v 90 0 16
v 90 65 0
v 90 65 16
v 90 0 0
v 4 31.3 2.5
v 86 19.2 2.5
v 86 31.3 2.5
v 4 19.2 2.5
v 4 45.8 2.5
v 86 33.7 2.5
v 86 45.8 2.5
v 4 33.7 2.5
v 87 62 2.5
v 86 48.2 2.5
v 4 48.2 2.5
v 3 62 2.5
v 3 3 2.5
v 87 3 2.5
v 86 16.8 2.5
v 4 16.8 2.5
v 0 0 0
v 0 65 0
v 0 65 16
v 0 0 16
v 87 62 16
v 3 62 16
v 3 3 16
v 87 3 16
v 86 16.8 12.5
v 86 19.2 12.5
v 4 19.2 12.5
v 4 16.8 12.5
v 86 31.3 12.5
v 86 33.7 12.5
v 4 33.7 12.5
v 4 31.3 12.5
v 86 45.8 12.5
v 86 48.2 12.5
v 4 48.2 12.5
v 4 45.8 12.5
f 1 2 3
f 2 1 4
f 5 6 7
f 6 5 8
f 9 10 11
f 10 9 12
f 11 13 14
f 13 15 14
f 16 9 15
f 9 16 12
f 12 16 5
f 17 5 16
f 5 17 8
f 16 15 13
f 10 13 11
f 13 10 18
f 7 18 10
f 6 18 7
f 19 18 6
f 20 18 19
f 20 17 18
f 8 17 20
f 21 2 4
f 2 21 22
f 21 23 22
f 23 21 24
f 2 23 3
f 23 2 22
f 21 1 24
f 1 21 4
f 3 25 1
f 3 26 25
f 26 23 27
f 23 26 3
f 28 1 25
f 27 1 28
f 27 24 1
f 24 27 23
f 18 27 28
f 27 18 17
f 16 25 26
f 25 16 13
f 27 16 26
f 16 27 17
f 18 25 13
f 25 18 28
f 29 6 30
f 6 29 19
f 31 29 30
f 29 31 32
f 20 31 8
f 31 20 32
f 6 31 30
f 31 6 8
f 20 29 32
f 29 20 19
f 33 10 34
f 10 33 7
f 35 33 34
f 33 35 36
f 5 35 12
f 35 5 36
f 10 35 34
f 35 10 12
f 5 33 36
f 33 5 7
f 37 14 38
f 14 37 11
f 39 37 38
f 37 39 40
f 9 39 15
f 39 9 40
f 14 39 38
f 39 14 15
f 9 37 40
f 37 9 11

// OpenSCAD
union() {
	translate(v = [45.0, 32.5, 1.25]) {
		cube(center = true, size = [90.0, 65.0, 2.5]);
	}
	translate(v = [45.0, 1.5, 9.25]) {
		cube(center = true, size = [90.0, 3.0, 13.5]);
	}
	translate(v = [45.0, 63.5, 9.25]) {
		cube(center = true, size = [90.0, 3.0, 13.5]);
	}
	translate(v = [1.5, 32.5, 9.25]) {
		cube(center = true, size = [3.0, 65.0, 13.5]);
	}
	translate(v = [88.5, 32.5, 9.25]) {
		cube(center = true, size = [3.0, 65.0, 13.5]);
	}
	translate(v = [45.0, 18.0, 7.5]) {
		cube(center = true, size = [82.0, 2.4, 10.0]);
	}
	translate(v = [45.0, 32.5, 7.5]) {
		cube(center = true, size = [82.0, 2.4, 10.0]);
	}
	translate(v = [45.0, 47.0, 7.5]) {
		cube(center = true, size = [82.0, 2.4, 10.0]);
	}
}
